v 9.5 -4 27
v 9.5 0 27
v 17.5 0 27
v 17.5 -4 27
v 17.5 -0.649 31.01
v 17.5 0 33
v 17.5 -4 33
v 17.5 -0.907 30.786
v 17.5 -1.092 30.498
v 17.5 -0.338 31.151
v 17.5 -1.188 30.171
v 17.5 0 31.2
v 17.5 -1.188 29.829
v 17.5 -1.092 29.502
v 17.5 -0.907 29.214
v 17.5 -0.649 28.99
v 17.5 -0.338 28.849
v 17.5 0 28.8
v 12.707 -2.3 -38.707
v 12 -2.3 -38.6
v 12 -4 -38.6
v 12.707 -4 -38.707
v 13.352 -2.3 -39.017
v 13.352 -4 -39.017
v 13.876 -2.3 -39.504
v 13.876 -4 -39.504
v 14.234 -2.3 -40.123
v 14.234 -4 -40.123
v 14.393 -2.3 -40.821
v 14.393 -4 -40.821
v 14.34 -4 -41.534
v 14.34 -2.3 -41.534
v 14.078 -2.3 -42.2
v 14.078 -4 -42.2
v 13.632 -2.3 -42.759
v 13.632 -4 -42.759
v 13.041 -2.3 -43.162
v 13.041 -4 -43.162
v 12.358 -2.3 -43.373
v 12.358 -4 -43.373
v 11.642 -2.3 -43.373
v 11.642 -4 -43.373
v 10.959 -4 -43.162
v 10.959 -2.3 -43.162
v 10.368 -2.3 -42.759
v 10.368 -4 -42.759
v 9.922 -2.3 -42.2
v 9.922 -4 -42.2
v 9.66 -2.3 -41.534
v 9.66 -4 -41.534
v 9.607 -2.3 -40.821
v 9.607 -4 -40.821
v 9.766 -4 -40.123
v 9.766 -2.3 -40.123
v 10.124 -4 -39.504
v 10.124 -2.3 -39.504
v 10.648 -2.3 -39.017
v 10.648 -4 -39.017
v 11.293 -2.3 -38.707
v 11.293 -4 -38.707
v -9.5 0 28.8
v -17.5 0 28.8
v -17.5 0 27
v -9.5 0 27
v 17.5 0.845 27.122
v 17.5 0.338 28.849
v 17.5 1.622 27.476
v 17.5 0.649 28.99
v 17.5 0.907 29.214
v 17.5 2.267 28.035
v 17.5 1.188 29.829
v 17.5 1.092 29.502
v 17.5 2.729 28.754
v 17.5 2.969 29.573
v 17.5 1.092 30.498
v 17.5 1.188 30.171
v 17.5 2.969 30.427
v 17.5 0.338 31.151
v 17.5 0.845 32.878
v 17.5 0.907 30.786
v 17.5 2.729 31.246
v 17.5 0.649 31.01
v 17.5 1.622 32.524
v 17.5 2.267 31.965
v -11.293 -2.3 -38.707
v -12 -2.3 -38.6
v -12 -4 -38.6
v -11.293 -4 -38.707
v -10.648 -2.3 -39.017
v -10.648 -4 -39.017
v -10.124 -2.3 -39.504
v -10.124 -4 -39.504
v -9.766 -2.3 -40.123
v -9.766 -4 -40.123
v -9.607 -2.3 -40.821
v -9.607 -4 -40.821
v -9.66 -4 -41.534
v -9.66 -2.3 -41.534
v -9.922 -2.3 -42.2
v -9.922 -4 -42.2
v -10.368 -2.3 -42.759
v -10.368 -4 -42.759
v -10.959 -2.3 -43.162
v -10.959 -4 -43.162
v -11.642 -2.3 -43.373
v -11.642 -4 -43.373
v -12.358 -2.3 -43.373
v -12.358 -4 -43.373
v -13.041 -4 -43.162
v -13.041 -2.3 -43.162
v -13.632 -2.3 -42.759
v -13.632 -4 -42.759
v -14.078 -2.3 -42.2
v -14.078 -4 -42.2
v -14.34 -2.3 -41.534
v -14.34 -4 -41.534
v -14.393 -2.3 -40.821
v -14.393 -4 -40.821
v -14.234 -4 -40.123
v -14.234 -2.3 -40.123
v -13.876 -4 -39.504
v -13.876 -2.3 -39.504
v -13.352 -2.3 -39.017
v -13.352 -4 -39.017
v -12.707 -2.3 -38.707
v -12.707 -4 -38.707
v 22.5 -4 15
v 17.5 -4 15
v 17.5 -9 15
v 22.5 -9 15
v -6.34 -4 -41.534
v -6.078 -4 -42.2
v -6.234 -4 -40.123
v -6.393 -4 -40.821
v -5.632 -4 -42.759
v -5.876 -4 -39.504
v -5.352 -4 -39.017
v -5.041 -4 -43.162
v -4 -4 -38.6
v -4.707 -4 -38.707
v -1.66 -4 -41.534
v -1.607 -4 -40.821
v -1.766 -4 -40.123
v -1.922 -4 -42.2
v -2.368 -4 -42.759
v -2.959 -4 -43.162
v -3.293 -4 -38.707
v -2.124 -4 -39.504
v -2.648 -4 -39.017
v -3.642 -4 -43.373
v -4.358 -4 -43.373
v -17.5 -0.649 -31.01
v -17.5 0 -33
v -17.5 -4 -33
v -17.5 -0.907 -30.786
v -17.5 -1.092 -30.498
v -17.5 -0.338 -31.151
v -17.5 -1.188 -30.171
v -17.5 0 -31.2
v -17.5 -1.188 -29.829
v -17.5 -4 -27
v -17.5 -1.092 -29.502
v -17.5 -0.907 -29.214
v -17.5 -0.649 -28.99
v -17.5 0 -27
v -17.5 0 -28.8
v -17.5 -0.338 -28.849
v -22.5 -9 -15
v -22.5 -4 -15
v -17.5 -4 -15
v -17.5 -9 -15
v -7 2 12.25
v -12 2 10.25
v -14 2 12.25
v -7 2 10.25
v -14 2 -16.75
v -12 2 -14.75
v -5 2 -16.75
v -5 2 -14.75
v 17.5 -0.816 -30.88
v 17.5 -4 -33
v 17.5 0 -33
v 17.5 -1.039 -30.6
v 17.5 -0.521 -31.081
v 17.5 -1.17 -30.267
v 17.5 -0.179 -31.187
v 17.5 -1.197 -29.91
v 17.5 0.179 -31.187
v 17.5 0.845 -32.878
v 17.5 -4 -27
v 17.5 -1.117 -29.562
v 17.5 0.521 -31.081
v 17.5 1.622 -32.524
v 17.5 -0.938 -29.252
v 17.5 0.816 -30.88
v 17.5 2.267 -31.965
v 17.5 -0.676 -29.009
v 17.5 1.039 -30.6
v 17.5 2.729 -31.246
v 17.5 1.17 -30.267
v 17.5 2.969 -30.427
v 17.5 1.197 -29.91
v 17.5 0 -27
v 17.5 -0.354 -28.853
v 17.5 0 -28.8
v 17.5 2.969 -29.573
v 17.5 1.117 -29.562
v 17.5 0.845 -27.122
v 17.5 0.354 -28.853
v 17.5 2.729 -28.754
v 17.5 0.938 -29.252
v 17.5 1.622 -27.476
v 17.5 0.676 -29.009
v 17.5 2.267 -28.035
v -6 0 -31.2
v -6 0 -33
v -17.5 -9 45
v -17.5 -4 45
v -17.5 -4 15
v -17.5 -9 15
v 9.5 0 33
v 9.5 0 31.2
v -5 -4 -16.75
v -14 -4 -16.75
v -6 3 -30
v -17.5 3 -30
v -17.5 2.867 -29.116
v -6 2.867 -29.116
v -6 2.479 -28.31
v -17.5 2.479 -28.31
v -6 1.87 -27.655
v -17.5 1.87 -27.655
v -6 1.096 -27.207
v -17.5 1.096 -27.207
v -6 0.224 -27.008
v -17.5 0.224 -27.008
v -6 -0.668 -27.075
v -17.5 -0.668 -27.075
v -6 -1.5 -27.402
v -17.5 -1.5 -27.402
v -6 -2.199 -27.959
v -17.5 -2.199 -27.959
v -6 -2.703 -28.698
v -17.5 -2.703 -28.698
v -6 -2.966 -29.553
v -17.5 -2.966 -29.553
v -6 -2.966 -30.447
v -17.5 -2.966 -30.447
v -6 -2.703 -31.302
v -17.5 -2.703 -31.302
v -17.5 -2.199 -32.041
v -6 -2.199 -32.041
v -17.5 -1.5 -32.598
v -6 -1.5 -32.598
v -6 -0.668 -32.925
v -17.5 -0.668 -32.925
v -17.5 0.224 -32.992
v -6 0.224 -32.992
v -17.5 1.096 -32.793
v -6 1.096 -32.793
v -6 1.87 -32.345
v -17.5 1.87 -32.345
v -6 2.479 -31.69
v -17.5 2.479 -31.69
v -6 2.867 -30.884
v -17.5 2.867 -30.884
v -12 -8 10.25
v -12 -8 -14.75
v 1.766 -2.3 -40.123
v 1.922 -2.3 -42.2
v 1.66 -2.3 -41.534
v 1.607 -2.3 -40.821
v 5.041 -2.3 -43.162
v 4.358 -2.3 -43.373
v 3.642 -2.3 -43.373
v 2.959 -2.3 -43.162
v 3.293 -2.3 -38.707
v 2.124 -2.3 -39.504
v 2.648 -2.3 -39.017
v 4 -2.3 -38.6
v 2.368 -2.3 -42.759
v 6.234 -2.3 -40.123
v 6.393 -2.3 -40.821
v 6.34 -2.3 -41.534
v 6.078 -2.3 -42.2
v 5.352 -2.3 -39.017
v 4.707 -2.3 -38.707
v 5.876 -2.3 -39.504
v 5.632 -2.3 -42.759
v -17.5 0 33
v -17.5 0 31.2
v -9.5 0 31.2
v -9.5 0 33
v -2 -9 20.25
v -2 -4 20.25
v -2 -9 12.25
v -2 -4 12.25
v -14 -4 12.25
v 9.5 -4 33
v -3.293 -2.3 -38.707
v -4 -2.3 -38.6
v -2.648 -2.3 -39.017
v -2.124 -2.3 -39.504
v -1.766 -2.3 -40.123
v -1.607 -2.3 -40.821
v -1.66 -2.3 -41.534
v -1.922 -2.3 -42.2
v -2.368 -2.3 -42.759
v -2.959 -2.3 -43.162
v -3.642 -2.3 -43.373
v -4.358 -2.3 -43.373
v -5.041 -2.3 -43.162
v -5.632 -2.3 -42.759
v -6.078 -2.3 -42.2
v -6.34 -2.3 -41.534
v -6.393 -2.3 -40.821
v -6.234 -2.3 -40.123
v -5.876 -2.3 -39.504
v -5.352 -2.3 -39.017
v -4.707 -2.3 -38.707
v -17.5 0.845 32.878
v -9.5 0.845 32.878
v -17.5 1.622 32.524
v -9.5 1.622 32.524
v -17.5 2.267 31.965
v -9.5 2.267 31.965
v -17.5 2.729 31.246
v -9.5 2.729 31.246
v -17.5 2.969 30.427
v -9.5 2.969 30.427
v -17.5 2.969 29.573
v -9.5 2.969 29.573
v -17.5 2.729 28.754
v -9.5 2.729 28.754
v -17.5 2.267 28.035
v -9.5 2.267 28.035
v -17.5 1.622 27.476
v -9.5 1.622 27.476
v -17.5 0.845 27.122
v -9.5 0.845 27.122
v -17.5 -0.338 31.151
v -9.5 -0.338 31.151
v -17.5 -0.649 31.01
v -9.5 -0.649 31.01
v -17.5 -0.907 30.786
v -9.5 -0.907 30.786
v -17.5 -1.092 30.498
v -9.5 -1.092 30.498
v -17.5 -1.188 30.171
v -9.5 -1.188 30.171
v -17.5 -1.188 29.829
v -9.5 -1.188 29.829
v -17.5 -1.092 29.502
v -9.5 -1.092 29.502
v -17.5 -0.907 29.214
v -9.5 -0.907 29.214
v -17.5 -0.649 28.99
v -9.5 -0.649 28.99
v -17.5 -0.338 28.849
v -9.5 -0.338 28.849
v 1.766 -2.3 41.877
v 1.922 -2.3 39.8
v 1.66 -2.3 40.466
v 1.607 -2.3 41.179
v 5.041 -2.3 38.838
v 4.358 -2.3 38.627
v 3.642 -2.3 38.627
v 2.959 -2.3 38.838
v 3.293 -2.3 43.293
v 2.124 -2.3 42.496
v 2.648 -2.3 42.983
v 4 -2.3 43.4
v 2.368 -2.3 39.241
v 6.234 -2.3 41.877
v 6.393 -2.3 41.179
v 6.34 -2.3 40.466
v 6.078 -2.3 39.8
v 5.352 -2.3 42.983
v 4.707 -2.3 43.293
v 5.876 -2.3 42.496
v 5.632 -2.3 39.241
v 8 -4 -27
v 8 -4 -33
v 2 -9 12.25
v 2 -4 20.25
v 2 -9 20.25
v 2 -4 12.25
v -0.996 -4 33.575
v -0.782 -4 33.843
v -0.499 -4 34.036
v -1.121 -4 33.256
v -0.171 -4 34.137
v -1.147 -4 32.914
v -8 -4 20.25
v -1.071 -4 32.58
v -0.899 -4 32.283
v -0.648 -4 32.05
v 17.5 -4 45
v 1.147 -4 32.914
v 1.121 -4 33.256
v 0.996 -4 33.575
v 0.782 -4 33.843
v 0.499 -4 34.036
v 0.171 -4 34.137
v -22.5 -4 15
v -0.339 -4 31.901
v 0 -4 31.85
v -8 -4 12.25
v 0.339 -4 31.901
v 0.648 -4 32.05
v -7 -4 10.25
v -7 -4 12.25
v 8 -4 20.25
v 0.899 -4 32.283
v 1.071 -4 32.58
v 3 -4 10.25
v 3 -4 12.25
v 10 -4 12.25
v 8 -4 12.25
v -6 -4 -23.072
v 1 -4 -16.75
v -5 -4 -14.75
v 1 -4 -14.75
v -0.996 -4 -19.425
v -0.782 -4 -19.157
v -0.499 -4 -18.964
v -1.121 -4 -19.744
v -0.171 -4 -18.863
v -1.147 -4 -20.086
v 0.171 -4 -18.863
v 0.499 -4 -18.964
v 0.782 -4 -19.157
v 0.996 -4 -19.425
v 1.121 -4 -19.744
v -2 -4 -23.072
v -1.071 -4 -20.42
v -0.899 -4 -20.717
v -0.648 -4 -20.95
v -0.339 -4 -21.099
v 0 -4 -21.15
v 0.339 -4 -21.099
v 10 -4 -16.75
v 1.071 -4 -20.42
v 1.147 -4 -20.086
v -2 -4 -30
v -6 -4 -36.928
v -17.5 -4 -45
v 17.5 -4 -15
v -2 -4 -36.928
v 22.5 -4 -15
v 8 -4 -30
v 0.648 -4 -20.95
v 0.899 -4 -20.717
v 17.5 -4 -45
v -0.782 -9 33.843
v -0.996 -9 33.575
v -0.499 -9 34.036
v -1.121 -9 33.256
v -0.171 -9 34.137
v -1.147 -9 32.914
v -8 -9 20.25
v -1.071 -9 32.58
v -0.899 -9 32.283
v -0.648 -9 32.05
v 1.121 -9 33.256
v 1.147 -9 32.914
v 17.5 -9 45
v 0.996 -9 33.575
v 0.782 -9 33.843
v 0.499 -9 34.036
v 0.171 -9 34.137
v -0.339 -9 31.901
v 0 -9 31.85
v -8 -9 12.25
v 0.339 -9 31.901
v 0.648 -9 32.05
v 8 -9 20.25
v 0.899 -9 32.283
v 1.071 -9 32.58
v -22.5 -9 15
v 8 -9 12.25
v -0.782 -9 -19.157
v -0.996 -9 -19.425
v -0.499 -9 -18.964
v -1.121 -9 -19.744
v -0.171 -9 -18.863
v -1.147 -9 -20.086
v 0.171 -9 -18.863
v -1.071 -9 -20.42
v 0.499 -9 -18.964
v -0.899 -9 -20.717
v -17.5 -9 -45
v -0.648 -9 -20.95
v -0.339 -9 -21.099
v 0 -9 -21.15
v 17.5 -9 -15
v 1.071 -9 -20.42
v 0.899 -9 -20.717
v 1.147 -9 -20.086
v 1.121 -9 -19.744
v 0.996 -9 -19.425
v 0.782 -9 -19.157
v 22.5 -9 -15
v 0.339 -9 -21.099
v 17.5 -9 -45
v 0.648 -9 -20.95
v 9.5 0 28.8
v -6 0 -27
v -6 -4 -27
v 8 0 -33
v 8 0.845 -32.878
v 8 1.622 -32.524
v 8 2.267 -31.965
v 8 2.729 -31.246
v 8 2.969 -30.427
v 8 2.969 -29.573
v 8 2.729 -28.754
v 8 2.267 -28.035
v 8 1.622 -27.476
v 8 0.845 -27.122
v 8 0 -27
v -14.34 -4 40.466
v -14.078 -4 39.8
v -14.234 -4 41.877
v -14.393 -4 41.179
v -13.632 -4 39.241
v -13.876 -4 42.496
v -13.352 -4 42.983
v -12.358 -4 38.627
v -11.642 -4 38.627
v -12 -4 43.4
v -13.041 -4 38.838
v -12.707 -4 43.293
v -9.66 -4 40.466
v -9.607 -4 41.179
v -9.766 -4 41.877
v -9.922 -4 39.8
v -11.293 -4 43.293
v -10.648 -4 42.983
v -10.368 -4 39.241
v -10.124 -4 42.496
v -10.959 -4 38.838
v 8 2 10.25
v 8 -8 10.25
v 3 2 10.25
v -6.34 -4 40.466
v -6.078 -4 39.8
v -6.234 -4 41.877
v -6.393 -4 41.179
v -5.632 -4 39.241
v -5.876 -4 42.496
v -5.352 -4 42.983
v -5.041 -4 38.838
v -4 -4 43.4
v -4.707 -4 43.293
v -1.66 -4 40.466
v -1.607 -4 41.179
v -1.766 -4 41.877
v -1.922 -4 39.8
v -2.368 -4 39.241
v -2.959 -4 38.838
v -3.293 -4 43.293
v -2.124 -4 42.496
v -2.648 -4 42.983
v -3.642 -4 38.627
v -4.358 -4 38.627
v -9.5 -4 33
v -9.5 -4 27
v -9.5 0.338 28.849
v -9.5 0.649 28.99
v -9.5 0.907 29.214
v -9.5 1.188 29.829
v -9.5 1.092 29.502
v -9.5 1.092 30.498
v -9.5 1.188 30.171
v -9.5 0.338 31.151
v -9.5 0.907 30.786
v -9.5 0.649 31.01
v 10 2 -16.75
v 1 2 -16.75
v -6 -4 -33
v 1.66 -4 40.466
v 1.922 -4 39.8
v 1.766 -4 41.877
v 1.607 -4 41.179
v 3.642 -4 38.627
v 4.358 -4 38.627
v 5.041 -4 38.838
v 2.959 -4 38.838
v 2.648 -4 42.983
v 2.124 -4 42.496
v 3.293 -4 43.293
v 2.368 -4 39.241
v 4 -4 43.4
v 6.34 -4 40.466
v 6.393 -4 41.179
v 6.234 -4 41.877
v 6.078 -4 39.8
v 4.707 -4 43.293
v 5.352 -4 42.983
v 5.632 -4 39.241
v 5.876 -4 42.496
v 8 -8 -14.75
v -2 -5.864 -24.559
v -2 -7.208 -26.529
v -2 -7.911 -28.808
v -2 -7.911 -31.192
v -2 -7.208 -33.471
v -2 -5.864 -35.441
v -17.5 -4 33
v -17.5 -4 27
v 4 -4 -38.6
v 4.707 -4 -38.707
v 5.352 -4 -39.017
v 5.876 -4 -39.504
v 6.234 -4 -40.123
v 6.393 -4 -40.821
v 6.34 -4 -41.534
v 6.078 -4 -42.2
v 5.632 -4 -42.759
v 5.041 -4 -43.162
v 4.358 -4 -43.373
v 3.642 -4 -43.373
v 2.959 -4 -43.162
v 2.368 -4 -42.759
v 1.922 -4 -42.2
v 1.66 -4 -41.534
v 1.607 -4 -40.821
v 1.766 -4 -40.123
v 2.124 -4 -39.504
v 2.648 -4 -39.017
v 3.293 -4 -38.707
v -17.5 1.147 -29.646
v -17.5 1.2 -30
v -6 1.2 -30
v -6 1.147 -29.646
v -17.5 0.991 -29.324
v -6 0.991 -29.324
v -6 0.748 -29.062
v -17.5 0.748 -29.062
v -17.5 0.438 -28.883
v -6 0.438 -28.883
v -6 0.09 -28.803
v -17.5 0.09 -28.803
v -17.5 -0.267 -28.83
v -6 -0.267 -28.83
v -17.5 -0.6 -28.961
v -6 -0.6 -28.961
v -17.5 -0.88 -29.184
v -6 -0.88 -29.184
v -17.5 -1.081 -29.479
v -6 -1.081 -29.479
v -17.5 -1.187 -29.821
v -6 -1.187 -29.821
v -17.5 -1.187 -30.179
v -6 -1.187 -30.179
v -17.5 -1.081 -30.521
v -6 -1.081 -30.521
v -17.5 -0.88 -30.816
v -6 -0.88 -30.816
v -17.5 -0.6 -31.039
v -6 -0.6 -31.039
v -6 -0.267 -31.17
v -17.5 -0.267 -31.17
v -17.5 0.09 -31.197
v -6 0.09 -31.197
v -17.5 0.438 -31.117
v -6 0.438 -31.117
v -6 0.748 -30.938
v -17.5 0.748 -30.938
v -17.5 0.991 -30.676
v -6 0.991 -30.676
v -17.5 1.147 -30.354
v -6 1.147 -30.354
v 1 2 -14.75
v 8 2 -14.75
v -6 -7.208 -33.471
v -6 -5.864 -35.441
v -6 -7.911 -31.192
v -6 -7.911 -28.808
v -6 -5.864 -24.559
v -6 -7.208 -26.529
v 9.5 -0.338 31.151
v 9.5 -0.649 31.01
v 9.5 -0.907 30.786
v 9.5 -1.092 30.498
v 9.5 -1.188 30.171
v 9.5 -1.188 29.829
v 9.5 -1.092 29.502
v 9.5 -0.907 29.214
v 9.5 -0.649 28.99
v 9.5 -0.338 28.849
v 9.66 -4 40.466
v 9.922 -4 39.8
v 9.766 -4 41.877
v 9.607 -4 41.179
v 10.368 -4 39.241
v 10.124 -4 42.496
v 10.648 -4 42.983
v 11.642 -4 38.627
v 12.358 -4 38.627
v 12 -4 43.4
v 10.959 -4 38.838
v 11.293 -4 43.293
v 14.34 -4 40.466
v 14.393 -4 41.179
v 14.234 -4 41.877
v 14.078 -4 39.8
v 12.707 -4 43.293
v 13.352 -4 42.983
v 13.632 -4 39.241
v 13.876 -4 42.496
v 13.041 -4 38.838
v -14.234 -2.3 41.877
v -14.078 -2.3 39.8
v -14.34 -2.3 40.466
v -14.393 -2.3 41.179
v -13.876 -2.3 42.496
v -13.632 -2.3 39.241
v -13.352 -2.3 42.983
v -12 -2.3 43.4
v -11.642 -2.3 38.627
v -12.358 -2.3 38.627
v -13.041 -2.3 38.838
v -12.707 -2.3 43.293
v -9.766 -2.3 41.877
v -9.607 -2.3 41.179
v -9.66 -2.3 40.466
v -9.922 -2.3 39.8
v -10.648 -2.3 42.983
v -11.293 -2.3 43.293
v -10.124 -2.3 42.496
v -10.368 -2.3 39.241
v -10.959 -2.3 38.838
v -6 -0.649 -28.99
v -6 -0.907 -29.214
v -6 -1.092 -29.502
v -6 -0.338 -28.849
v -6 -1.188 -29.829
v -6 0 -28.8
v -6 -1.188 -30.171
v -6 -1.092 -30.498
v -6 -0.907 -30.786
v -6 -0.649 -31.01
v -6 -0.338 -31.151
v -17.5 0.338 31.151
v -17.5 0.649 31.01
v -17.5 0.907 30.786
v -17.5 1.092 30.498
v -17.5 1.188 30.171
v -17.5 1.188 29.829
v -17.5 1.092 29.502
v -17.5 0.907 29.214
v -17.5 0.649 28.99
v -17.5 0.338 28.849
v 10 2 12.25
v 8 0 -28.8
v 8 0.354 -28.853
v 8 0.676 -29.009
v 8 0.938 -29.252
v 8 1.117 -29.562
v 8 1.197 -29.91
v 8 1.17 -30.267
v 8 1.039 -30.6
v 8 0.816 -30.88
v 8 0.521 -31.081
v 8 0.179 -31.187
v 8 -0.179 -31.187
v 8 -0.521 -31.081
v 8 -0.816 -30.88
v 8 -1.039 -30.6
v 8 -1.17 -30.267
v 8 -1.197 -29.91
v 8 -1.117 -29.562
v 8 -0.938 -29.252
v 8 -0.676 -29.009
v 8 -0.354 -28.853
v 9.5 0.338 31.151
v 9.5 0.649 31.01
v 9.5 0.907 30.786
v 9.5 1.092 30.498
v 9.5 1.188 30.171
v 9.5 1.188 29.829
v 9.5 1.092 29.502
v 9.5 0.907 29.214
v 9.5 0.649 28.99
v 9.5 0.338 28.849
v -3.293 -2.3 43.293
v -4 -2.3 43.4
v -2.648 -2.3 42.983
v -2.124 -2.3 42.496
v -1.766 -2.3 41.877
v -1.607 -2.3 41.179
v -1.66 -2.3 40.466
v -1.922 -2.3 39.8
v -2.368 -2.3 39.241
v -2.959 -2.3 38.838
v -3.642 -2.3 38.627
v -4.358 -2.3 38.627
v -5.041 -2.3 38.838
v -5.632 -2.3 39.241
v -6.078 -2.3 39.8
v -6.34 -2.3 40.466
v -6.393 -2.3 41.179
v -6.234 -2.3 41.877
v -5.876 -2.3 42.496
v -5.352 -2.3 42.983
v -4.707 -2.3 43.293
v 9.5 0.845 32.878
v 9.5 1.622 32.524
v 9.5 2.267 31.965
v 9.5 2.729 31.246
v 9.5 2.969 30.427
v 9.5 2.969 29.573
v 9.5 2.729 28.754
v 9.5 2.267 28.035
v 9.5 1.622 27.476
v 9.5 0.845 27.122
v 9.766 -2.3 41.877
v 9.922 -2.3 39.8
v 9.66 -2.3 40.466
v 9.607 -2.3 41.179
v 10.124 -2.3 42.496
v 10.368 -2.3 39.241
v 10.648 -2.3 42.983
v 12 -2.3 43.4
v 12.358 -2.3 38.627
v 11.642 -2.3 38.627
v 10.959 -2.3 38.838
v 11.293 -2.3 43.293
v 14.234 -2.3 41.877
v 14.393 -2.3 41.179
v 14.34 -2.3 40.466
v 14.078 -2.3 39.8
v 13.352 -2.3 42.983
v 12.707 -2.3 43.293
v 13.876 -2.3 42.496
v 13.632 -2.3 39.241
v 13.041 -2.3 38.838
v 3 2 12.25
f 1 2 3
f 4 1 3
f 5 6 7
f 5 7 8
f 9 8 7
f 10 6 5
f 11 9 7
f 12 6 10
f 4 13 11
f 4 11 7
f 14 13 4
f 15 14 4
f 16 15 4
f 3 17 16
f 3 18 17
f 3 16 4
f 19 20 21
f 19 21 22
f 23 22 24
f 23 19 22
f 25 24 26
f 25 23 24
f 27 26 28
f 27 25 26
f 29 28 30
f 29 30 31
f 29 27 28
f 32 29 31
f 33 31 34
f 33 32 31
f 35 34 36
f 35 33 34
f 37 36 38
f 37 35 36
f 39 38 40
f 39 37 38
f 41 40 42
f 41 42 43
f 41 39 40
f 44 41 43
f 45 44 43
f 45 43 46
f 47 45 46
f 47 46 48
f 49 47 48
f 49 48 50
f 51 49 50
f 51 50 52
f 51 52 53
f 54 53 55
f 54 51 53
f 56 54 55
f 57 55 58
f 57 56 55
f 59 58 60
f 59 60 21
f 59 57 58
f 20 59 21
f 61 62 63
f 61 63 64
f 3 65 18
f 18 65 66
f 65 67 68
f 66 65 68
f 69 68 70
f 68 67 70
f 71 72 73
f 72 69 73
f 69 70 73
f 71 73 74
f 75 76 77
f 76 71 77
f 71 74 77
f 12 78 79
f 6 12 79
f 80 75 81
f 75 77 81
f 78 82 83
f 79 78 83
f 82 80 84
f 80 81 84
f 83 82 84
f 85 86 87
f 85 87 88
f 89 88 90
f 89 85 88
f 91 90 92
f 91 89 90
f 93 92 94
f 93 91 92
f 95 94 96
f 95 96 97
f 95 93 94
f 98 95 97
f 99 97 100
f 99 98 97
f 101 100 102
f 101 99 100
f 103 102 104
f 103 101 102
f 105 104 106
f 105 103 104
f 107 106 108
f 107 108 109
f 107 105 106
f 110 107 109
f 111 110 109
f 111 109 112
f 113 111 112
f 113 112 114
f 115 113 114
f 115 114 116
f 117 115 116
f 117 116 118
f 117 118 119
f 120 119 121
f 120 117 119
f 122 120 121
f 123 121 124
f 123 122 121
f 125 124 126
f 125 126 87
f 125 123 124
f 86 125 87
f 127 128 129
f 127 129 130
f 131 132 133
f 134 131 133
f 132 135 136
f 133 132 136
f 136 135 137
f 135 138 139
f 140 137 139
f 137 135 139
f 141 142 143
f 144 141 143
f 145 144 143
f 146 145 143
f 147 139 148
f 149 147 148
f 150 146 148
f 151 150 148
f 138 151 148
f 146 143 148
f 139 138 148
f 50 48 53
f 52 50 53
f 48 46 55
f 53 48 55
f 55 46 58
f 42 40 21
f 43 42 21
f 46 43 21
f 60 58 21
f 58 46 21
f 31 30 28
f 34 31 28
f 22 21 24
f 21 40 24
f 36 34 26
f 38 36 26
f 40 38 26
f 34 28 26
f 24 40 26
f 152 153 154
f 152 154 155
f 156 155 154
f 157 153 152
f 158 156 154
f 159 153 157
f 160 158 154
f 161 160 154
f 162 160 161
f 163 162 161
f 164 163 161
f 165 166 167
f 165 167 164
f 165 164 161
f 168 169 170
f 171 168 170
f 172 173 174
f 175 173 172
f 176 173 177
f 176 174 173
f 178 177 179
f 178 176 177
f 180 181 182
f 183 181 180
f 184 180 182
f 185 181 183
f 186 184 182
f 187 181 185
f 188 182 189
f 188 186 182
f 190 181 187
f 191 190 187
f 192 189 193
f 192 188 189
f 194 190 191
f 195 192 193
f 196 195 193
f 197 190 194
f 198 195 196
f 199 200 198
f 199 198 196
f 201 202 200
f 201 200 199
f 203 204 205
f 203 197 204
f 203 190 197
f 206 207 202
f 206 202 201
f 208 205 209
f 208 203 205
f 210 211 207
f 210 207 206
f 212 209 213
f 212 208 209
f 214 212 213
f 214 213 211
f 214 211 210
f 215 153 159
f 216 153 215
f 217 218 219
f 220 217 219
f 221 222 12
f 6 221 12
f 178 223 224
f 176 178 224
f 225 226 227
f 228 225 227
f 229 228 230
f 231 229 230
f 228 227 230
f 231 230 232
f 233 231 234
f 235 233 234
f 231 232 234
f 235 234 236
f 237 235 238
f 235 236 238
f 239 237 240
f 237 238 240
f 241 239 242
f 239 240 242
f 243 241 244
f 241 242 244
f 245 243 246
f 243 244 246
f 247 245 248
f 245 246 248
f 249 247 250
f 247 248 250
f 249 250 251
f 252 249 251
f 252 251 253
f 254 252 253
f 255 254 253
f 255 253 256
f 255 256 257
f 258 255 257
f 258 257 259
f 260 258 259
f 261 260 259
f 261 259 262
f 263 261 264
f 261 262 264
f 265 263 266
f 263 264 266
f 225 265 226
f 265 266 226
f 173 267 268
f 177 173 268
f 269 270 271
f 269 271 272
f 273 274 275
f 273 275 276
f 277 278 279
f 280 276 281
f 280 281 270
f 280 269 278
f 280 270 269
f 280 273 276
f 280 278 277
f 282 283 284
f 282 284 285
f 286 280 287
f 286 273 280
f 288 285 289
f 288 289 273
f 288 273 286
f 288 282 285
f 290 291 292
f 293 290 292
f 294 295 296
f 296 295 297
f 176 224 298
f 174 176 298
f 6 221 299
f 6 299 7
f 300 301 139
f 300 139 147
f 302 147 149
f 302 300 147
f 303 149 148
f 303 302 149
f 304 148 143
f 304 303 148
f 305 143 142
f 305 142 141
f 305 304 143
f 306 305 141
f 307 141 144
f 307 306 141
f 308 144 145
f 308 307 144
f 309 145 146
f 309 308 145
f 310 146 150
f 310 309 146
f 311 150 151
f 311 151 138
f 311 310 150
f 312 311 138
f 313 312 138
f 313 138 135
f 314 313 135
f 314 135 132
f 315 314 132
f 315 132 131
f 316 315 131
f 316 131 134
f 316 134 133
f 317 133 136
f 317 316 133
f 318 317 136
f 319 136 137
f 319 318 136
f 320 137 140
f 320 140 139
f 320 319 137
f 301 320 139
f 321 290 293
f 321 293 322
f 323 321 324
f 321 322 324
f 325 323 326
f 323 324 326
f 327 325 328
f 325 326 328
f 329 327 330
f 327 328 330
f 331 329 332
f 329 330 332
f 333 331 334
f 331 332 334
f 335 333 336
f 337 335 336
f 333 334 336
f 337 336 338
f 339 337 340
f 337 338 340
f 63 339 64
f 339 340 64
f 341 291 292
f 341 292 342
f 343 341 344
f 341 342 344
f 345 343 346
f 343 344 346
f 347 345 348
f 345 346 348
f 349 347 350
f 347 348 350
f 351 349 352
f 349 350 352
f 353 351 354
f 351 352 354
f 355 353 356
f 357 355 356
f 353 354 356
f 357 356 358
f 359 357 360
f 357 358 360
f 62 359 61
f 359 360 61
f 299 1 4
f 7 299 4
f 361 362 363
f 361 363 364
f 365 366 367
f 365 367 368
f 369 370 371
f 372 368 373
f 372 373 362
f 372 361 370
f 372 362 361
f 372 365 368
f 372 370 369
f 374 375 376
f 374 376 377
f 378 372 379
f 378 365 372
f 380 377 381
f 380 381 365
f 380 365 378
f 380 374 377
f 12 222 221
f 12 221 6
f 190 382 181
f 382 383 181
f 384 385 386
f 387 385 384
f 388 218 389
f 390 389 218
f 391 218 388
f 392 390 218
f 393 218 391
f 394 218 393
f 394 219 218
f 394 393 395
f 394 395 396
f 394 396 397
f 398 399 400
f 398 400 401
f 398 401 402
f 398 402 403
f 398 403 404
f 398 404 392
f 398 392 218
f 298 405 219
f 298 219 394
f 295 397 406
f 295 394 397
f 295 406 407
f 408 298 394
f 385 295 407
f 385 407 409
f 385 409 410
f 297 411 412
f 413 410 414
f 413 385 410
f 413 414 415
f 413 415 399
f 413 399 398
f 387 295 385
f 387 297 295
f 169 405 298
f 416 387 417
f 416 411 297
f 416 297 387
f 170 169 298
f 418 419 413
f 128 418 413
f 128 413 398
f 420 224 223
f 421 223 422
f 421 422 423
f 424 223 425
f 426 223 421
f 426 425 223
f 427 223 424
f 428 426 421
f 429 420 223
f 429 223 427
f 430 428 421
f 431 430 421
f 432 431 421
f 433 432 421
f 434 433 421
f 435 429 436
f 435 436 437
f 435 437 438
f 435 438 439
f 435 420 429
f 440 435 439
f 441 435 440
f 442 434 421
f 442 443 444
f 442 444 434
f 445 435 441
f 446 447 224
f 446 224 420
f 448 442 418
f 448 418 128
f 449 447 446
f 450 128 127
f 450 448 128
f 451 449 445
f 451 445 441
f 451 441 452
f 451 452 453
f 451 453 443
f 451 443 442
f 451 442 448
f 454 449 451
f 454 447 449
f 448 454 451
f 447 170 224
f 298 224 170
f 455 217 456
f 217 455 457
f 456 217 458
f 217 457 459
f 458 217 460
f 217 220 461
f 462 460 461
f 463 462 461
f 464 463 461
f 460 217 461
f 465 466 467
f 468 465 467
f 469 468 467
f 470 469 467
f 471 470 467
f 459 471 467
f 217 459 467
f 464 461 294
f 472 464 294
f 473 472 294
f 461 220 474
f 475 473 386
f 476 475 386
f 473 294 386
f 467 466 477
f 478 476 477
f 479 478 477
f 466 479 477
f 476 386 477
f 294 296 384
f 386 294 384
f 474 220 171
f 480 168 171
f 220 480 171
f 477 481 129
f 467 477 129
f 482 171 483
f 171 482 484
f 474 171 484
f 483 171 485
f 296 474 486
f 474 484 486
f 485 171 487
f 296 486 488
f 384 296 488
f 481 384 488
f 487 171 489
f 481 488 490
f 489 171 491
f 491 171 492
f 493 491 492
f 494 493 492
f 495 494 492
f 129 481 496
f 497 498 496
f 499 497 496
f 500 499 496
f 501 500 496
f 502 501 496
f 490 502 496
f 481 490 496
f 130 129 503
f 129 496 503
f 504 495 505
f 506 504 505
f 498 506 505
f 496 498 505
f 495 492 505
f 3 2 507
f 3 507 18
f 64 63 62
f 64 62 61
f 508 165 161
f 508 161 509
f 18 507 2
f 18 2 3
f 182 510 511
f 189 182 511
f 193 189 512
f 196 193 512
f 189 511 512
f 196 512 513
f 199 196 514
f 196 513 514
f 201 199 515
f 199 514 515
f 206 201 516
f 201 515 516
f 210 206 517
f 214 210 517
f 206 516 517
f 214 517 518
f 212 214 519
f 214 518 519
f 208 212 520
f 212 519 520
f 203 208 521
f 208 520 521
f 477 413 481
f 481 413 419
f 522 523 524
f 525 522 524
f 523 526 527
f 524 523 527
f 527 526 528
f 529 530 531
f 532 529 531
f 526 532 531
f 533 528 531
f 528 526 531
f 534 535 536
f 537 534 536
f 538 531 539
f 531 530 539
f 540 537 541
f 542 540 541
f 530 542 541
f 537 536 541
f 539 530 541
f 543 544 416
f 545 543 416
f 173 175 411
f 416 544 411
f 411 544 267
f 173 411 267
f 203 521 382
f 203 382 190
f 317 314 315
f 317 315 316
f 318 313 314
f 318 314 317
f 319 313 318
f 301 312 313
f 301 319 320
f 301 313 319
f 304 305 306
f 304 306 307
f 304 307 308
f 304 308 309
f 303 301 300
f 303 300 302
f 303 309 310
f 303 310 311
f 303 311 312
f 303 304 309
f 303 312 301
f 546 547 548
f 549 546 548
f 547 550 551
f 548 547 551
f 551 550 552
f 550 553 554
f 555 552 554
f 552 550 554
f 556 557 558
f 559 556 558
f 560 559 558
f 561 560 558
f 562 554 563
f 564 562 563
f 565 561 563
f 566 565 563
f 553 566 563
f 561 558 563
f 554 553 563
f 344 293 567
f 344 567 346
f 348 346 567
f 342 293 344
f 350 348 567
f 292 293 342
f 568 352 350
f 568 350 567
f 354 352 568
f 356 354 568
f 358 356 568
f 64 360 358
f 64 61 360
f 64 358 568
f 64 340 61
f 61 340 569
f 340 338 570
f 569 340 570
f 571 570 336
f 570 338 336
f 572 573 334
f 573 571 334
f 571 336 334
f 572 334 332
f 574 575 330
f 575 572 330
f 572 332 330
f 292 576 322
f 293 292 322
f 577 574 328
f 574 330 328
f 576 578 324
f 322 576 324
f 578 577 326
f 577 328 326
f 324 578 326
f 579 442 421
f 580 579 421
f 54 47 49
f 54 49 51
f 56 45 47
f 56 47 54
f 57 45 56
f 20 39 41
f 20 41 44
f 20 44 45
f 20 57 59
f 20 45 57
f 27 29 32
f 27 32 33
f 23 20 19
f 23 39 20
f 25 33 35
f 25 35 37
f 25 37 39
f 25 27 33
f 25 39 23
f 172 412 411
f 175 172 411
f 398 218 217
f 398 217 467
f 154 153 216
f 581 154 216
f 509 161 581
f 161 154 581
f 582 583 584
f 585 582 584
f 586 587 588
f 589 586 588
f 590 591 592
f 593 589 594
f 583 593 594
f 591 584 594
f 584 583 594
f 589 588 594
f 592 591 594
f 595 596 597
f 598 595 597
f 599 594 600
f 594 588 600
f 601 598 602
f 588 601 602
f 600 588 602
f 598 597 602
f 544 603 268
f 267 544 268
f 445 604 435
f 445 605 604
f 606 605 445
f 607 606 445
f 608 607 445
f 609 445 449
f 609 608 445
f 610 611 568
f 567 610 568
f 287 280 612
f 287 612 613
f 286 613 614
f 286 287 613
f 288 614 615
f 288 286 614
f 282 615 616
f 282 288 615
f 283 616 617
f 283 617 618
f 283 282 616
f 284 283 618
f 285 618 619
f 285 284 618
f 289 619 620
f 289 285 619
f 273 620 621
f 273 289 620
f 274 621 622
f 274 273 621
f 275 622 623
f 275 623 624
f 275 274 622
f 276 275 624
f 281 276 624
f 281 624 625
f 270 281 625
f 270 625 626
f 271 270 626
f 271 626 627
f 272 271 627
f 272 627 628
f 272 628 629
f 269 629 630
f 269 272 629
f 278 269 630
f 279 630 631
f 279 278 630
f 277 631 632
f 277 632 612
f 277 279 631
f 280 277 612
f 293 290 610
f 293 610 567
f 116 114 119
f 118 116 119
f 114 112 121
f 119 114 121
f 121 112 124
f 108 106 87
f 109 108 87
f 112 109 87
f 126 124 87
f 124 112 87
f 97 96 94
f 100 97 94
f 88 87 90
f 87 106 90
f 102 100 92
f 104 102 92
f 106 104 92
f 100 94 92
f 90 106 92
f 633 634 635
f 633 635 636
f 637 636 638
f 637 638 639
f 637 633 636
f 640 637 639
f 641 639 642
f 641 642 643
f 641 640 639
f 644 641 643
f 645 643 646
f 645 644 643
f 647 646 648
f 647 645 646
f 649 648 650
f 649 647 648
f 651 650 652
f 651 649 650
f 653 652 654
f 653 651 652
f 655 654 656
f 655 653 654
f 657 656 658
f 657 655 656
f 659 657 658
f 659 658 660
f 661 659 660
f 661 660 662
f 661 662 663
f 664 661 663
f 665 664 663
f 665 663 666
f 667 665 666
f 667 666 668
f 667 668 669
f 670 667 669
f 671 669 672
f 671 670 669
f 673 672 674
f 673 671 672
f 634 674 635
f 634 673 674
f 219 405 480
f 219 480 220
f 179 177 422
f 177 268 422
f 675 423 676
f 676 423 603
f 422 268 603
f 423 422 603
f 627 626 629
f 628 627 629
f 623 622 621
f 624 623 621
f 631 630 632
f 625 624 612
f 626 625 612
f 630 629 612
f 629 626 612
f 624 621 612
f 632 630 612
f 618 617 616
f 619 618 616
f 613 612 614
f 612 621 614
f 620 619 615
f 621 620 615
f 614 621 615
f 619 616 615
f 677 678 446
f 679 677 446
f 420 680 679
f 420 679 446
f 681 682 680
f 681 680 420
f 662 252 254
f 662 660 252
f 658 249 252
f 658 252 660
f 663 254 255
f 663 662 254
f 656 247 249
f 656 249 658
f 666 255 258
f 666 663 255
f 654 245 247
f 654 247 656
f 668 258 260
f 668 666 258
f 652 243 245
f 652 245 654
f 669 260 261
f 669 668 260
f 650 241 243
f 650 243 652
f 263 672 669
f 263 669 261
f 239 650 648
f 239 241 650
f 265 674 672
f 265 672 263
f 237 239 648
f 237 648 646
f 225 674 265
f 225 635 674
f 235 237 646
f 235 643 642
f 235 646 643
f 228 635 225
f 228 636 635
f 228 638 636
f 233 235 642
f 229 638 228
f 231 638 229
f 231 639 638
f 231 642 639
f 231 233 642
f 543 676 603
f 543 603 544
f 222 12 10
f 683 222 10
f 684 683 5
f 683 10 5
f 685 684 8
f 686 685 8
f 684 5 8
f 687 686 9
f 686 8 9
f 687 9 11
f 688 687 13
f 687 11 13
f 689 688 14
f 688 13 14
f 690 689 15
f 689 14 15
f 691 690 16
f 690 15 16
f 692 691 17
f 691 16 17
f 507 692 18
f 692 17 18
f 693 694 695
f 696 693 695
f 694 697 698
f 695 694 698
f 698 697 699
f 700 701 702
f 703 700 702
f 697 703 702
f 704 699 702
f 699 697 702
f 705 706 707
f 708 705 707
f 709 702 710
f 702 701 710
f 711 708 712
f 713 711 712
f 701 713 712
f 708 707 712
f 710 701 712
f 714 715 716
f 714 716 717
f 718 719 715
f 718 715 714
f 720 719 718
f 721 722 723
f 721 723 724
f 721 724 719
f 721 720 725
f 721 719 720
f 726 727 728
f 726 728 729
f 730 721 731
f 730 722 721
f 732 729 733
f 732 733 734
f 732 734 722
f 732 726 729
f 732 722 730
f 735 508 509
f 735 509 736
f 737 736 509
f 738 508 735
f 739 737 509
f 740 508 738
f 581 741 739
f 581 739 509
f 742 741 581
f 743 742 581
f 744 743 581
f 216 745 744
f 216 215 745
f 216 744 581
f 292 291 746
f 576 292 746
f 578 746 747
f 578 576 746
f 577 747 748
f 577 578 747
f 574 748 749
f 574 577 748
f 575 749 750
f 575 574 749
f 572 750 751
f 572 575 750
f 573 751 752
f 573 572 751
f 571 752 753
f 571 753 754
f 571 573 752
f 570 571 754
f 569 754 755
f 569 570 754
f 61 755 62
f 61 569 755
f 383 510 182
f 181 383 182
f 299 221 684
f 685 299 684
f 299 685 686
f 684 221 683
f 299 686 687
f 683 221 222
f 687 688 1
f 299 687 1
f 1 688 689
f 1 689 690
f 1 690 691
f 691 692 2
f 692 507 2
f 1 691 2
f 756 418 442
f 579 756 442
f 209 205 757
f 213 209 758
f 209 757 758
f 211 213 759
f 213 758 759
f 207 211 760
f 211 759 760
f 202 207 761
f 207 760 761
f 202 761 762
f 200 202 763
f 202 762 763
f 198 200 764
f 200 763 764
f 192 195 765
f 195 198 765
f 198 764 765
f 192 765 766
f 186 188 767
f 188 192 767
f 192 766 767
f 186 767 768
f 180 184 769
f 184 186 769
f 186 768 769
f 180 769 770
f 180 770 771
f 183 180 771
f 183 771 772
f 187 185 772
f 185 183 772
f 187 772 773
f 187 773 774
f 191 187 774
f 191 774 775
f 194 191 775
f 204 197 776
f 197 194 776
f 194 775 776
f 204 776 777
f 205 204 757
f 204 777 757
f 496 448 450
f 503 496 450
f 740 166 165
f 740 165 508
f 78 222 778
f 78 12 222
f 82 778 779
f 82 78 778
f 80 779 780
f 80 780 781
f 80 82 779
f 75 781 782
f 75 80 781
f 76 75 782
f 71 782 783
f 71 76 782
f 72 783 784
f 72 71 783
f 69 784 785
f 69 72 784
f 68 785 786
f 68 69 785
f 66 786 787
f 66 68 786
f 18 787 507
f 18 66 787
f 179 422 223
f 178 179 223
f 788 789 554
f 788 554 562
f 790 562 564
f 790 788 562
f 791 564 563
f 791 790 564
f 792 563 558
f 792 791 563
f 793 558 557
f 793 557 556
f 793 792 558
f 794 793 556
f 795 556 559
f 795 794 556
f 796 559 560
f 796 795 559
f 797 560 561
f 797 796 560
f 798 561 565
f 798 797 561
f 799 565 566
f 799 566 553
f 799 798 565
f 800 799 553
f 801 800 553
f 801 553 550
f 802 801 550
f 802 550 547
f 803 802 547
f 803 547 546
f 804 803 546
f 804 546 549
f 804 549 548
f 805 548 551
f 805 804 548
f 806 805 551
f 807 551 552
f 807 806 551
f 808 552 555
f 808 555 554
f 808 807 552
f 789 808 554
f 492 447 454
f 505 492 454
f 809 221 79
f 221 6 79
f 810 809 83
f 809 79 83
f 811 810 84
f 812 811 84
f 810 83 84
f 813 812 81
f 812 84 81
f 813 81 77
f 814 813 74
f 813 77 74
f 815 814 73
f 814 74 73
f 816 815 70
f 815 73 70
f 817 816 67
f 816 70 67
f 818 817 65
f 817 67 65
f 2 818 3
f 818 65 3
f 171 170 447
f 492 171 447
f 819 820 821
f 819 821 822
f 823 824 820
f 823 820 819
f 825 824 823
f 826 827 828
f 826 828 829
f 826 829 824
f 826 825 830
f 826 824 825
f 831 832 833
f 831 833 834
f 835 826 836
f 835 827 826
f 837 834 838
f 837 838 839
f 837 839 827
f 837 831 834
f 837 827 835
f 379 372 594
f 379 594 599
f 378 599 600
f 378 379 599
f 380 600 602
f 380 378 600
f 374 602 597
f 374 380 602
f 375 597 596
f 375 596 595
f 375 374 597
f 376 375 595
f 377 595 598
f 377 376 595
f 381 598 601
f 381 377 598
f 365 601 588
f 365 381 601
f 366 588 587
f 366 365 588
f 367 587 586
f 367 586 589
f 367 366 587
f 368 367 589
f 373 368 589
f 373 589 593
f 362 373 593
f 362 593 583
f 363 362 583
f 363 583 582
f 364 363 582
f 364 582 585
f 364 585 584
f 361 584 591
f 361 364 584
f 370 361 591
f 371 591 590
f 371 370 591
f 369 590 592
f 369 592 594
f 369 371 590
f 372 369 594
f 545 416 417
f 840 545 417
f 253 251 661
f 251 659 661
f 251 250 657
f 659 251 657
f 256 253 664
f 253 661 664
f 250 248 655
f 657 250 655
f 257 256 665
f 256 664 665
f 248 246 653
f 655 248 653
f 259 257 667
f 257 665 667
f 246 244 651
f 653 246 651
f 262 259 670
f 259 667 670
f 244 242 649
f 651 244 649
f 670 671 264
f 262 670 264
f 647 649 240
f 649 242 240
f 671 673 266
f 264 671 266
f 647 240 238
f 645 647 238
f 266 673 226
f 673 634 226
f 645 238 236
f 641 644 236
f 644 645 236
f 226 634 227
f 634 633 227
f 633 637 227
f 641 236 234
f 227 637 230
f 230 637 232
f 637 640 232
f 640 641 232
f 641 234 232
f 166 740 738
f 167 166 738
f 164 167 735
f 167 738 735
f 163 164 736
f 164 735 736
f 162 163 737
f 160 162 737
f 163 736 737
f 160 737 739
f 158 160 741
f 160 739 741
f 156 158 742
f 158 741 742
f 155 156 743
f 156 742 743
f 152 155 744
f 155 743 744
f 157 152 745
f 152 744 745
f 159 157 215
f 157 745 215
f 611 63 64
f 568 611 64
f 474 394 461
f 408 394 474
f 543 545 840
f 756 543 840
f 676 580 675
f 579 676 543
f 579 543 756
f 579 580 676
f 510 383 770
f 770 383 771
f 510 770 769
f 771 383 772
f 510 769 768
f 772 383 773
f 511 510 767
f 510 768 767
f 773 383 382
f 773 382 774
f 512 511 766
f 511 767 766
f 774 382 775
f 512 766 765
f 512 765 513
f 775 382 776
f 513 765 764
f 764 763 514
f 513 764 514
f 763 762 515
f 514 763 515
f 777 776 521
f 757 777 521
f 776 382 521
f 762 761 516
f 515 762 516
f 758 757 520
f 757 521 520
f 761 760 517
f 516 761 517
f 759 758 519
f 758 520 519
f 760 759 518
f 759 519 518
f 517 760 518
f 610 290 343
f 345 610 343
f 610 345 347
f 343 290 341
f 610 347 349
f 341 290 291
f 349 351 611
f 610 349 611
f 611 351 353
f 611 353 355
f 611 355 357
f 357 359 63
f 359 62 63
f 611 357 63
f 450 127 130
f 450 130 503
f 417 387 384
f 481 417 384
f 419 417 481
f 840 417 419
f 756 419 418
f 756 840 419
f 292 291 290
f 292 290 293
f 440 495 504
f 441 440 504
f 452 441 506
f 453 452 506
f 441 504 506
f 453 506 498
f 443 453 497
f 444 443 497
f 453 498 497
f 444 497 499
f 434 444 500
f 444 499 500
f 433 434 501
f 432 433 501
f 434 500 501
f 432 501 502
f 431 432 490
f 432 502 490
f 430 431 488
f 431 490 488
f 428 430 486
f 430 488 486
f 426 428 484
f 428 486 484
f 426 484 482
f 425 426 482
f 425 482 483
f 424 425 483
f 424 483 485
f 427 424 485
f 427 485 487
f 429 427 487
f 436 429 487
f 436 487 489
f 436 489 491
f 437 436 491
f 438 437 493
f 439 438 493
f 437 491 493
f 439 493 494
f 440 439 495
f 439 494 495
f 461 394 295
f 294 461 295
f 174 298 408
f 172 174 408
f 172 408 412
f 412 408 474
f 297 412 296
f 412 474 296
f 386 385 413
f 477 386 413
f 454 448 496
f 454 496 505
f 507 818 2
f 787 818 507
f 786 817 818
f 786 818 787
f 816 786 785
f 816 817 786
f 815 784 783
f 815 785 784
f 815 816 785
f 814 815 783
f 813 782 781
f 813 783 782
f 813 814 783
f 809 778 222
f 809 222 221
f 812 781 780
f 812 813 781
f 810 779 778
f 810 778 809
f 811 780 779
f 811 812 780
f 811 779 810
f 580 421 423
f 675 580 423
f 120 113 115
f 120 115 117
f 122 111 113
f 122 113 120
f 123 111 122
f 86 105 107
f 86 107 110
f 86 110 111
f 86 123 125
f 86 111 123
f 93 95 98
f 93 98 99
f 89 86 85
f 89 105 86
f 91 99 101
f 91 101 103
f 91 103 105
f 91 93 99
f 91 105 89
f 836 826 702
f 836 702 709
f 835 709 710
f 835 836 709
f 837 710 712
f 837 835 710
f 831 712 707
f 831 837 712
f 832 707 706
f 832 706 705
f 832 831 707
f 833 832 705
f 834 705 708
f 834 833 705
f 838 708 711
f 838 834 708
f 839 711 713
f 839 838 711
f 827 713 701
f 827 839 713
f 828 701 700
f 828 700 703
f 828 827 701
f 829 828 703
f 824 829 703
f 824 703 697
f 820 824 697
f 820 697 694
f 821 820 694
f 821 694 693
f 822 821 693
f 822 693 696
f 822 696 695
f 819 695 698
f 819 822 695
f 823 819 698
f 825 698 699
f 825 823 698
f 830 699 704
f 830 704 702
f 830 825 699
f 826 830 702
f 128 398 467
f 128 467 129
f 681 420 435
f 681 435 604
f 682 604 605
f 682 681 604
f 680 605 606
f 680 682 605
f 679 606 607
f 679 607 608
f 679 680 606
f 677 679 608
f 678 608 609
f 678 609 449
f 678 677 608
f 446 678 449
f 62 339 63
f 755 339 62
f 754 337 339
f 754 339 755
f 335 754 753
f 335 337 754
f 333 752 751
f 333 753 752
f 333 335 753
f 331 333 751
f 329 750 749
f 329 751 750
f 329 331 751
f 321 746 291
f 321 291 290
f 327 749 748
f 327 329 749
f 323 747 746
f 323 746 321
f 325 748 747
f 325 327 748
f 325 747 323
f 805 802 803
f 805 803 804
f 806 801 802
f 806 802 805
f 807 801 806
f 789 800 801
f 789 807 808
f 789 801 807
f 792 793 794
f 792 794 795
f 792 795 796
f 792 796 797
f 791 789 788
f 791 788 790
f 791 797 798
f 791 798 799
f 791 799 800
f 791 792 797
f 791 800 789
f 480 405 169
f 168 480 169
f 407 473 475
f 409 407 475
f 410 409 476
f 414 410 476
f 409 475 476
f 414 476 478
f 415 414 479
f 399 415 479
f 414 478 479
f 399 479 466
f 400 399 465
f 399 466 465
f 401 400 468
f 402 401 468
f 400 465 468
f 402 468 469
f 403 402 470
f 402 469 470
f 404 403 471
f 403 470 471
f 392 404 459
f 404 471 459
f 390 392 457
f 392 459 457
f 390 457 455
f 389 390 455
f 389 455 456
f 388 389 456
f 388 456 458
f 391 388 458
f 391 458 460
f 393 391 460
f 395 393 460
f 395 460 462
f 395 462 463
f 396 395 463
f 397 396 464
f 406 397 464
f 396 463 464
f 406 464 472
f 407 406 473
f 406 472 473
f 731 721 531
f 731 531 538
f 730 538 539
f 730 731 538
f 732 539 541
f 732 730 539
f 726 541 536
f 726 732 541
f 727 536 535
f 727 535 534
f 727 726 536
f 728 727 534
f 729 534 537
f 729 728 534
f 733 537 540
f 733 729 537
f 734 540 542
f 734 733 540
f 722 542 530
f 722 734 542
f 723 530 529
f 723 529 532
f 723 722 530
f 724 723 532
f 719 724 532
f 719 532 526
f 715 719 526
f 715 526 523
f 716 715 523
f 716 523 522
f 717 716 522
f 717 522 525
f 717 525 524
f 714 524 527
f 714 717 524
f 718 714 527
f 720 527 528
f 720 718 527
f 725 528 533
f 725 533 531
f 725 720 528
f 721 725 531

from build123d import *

# Parameters (mm, degrees)
SKETCH1_W             = 9.5
SKETCH1_H             = 1.8
SKETCH1_H_2           = 1.2
SKETCH1_H_3           = 3
SKETCH1_W_2           = 11.5
SKETCH1_W_3           = 8
SKETCH1_H_4           = 6
BOSS_EXTRUDE1_DEPTH   = 4
SKETCH1_3_W           = 8
SKETCH1_3_H           = 1.8
REVOLVE1_ANGLE        = 180
REVOLVE2_START        = -17.5
REVOLVE2_OUTLINE_R    = 3
REVOLVE2_OUTLINE_R_2  = 1.2
REVOLVE2_DEPTH        = 11.5
REVOLVE2_START_2      = 8
REVOLVE2_2_DEPTH      = 9.5
SKETCH1_6_W           = 11.5
SKETCH1_6_H           = 1.2
SKETCH1_6_W_2         = 9.5
BOSS_EXTRUDE2_START   = -4
SKETCH1_7_W           = 35
SKETCH1_7_H           = 90
SKETCH1_7_W_2         = 5
SKETCH1_7_H_2         = 30
BOSS_EXTRUDE2_DEPTH   = 5
SKETCH1_9_W           = 8
SKETCH1_9_H           = 1.2
SKETCH1_10_W          = 4
SKETCH1_10_H          = 3
SKETCH1_10_W_2        = 10
SKETCH1_10_H_2        = 1
CUT_EXTRUDE2_DEPTH    = 4
SKETCH9_R             = 1.15
CUT_EXTRUDE4_DEPTH    = 5
SKETCH10_W            = 6
SKETCH10_H            = 8
CUT_EXTRUDE5_DEPTH    = 5
BOSS_EXTRUDE3_DEPTH   = 6
BOSS_EXTRUDE4_START   = -2.3
SKETCH1_12_R          = 2.4
BOSS_EXTRUDE4_DEPTH   = 1.7
BOSS_EXTRUDE4_2_DEPTH = 1.7
BOSS_EXTRUDE4_3_DEPTH = 1.7
BOSS_EXTRUDE4_4_DEPTH = 1.7
BOSS_EXTRUDE4_5_DEPTH = 1.7
BOSS_EXTRUDE4_6_DEPTH = 1.7
BOSS_EXTRUDE4_7_DEPTH = 1.7
BOSS_EXTRUDE4_8_DEPTH = 1.7


# Read off the part's stored shape, not the designer's step: Revolve2
with BuildPart() as part:
    # Sketch1 → Boss-Extrude1 (new body)
    with BuildSketch(Plane(origin=(0, 0, 0), x_dir=(1, 0, 0), z_dir=(0, 1, 0))):
        with Locations((12.75, 27.9)):
            Rectangle(SKETCH1_W, SKETCH1_H)
        with Locations((12.75, 29.4)):
            Rectangle(SKETCH1_W, SKETCH1_H_2)
        with Locations((12.75, 31.5)):
            Rectangle(SKETCH1_W, SKETCH1_H_3)
        with Locations((-11.75, 27.9)):
            Rectangle(SKETCH1_W_2, SKETCH1_H)
        with Locations((-11.75, 29.4)):
            Rectangle(SKETCH1_W_2, SKETCH1_H_2)
        with Locations((-11.75, 31.5)):
            Rectangle(SKETCH1_W_2, SKETCH1_H_3)
        with Locations((13.5, -30)):
            Rectangle(SKETCH1_W_3, SKETCH1_H_4)
        with Locations((-13.5, -30)):
            Rectangle(SKETCH1_W_3, SKETCH1_H_4)
    extrude(amount=-BOSS_EXTRUDE1_DEPTH)

    # Revolve2 2 outline → Revolve2 2 (add)
    with BuildSketch(Plane.YZ.offset(REVOLVE2_START_2)):
        with BuildLine():
            Line((0, -27), (0, -28.8))
            ThreePointArc((0, -28.8), (1.2, -30), (0, -31.2))
            Line((0, -31.2), (0, -33))
            ThreePointArc((0, -33), (3, -30), (0, -27))
        make_face()
    extrude(amount=REVOLVE2_2_DEPTH)

    # Sketch1<6> → Cut-Revolve2 (revolve, cut)
    with BuildSketch(Plane(origin=(0, 0, 0), x_dir=(1, 0, 0), z_dir=(0, 1, 0))):
        with Locations((-11.75, 29.4)):
            Rectangle(SKETCH1_6_W, SKETCH1_6_H)
        with Locations((12.75, 29.4)):
            Rectangle(SKETCH1_6_W_2, SKETCH1_6_H)
        Polygon((-2, 30), (-6, 30), (-6, 28.8), (8, 28.8), (8, 30), align=None)
    revolve(axis=Axis((-17.5, 0, -30), (1, 0, 0)), mode=Mode.SUBTRACT)

    # Sketch1<9> → Cut-Revolve7 (revolve, cut)
    with BuildSketch(Plane(origin=(0, 0, 0), x_dir=(1, 0, 0), z_dir=(0, 1, 0))):
        with Locations((-13.5, -30.6)):
            Rectangle(SKETCH1_9_W, SKETCH1_9_H)
        with Locations((13.5, -30.6)):
            Rectangle(SKETCH1_9_W, SKETCH1_9_H)
    revolve(axis=Axis((-17.5, 0, 30), (1, 0, 0)), mode=Mode.SUBTRACT)


with BuildPart() as body_2:
    # Sketch1<3> → Revolve1 (revolve)
    with BuildSketch(Plane(origin=(0, 0, 0), x_dir=(1, 0, 0), z_dir=(0, 1, 0))):
        with Locations((-13.5, -32.1)):
            Rectangle(SKETCH1_3_W, SKETCH1_3_H)
        with Locations((13.5, -32.1)):
            Rectangle(SKETCH1_3_W, SKETCH1_3_H)
    revolve(axis=Axis((-17.5, 0, 30), (-1, 0, 0)), revolution_arc=REVOLVE1_ANGLE)


with BuildPart() as body_3:
    # Revolve2 outline → Revolve2 (new body)
    with BuildSketch(Plane.YZ.offset(REVOLVE2_START)):
        with Locations((0, -30)):
            Circle(REVOLVE2_OUTLINE_R)
        with Locations((0, -30)):
            Circle(REVOLVE2_OUTLINE_R_2, mode=Mode.SUBTRACT)
    extrude(amount=REVOLVE2_DEPTH)


with BuildPart() as body_4:
    # Sketch1<7> → Boss-Extrude2 (new body)
    with BuildSketch(Plane(origin=(0, 0, 0), x_dir=(1, 0, 0), z_dir=(0, 1, 0)).offset(BOSS_EXTRUDE2_START)):
        Rectangle(SKETCH1_7_W, SKETCH1_7_H)
        with Locations((-20, 0)):
            Rectangle(SKETCH1_7_W_2, SKETCH1_7_H_2)
        with Locations((20, 0)):
            Rectangle(SKETCH1_7_W_2, SKETCH1_7_H_2)
    extrude(amount=-BOSS_EXTRUDE2_DEPTH)

    # Sketch1<10> → Cut-Revolve8 (revolve, cut)
    with BuildSketch(Plane(origin=(0, 0, 0), x_dir=(1, 0, 0), z_dir=(0, 1, 0)), mode=Mode.PRIVATE) as cut_revolve8_sk:
        Polygon((-6, 38), (-6, 33), (-2, 33), (-2, 34), (-2, 38), align=None)
        with Locations((-4, 31.5)):
            Rectangle(SKETCH1_10_W, SKETCH1_10_H)
        with Locations((3, 33.5)):
            Rectangle(SKETCH1_10_W_2, SKETCH1_10_H_2)
        with Locations((3, 31.5)):
            Rectangle(SKETCH1_10_W_2, SKETCH1_10_H)
    revolve(cut_revolve8_sk.sketch.rotate(Axis((-17.5, 0, -30), (1, 0, 0)), 180), axis=Axis((-17.5, 0, -30), (1, 0, 0)), mode=Mode.SUBTRACT)

    # Sketch4 → Cut-Extrude2 (cut)
    with BuildSketch(Plane(origin=(0, -4, 0), x_dir=(1, 0, 0), z_dir=(0, 1, 0))):
        Polygon((-12, 14.75), (-5, 14.75), (8, 14.75), (8, -10.25), (-12, -10.25), align=None)
    extrude(amount=-CUT_EXTRUDE2_DEPTH, mode=Mode.SUBTRACT)

    # Sketch9 → Cut-Extrude4 (cut)
    with BuildSketch(Plane.XZ.offset(9)):
        with Locations(Location((0, 33, 0), (0, 0, 270))):
            Circle(SKETCH9_R)
        with Locations(Location((0, -20, 0), (0, 0, 270))):
            Circle(SKETCH9_R)
    extrude(amount=-CUT_EXTRUDE4_DEPTH, mode=Mode.SUBTRACT)

    # Sketch10 → Cut-Extrude5 (cut)
    with BuildSketch(Plane(origin=(0, -4, 0), x_dir=(1, 0, 0), z_dir=(0, 1, 0))):
        with Locations((-5, -16.25)):
            Rectangle(SKETCH10_W, SKETCH10_H)
        with Locations((5, -16.25)):
            Rectangle(SKETCH10_W, SKETCH10_H)
    extrude(amount=-CUT_EXTRUDE5_DEPTH, mode=Mode.SUBTRACT)

    # Sketch4<6> → Boss-Extrude3 (add)
    with BuildSketch(Plane(origin=(0, -4, 0), x_dir=(1, 0, 0), z_dir=(0, 1, 0))):
        Polygon((-12, -10.25), (-12, 14.75), (-5, 14.75), (-5, 16.75), (-14, 16.75), (-14, -12.25), (-7, -12.25), (-7, -10.25), align=None)
        Polygon((1, 16.75), (1, 14.75), (8, 14.75), (8, -10.25), (3, -10.25), (3, -12.25), (10, -12.25), (10, 16.75), align=None)
    extrude(amount=BOSS_EXTRUDE3_DEPTH)


with BuildPart() as body_5:
    # Sketch1<12> → Boss-Extrude4 (new body)
    with BuildSketch(Plane(origin=(0, 0, 0), x_dir=(1, 0, 0), z_dir=(0, 1, 0)).offset(BOSS_EXTRUDE4_START)):
        with Locations(Location((-4, 41, 0), (0, 0, 270))):
            Circle(SKETCH1_12_R)
    extrude(amount=-BOSS_EXTRUDE4_DEPTH)


with BuildPart() as body_6:
    # Sketch1<12> → Boss-Extrude4 2 (new body)
    with BuildSketch(Plane(origin=(0, 0, 0), x_dir=(1, 0, 0), z_dir=(0, 1, 0)).offset(BOSS_EXTRUDE4_START)):
        with Locations(Location((4, 41, 0), (0, 0, 270))):
            Circle(SKETCH1_12_R)
    extrude(amount=-BOSS_EXTRUDE4_2_DEPTH)


with BuildPart() as body_7:
    # Sketch1<12> → Boss-Extrude4 3 (new body)
    with BuildSketch(Plane(origin=(0, 0, 0), x_dir=(1, 0, 0), z_dir=(0, 1, 0)).offset(BOSS_EXTRUDE4_START)):
        with Locations(Location((-12, 41, 0), (0, 0, 270))):
            Circle(SKETCH1_12_R)
    extrude(amount=-BOSS_EXTRUDE4_3_DEPTH)


with BuildPart() as body_8:
    # Sketch1<12> → Boss-Extrude4 4 (new body)
    with BuildSketch(Plane(origin=(0, 0, 0), x_dir=(1, 0, 0), z_dir=(0, 1, 0)).offset(BOSS_EXTRUDE4_START)):
        with Locations(Location((12, 41, 0), (0, 0, 270))):
            Circle(SKETCH1_12_R)
    extrude(amount=-BOSS_EXTRUDE4_4_DEPTH)


with BuildPart() as body_9:
    # Sketch1<12> → Boss-Extrude4 5 (new body)
    with BuildSketch(Plane(origin=(0, 0, 0), x_dir=(1, 0, 0), z_dir=(0, 1, 0)).offset(BOSS_EXTRUDE4_START)):
        with Locations(Location((12, -41, 0), (0, 0, 270))):
            Circle(SKETCH1_12_R)
    extrude(amount=-BOSS_EXTRUDE4_5_DEPTH)


with BuildPart() as body_10:
    # Sketch1<12> → Boss-Extrude4 6 (new body)
    with BuildSketch(Plane(origin=(0, 0, 0), x_dir=(1, 0, 0), z_dir=(0, 1, 0)).offset(BOSS_EXTRUDE4_START)):
        with Locations(Location((4, -41, 0), (0, 0, 270))):
            Circle(SKETCH1_12_R)
    extrude(amount=-BOSS_EXTRUDE4_6_DEPTH)


with BuildPart() as body_11:
    # Sketch1<12> → Boss-Extrude4 7 (new body)
    with BuildSketch(Plane(origin=(0, 0, 0), x_dir=(1, 0, 0), z_dir=(0, 1, 0)).offset(BOSS_EXTRUDE4_START)):
        with Locations(Location((-4, -41, 0), (0, 0, 270))):
            Circle(SKETCH1_12_R)
    extrude(amount=-BOSS_EXTRUDE4_7_DEPTH)


with BuildPart() as body_12:
    # Sketch1<12> → Boss-Extrude4 8 (new body)
    with BuildSketch(Plane(origin=(0, 0, 0), x_dir=(1, 0, 0), z_dir=(0, 1, 0)).offset(BOSS_EXTRUDE4_START)):
        with Locations(Location((-12, -41, 0), (0, 0, 270))):
            Circle(SKETCH1_12_R)
    extrude(amount=-BOSS_EXTRUDE4_8_DEPTH)


solid = Compound([part.part, body_2.part, body_3.part, body_4.part, body_5.part, body_6.part, body_7.part, body_8.part, body_9.part, body_10.part, body_11.part, body_12.part])
